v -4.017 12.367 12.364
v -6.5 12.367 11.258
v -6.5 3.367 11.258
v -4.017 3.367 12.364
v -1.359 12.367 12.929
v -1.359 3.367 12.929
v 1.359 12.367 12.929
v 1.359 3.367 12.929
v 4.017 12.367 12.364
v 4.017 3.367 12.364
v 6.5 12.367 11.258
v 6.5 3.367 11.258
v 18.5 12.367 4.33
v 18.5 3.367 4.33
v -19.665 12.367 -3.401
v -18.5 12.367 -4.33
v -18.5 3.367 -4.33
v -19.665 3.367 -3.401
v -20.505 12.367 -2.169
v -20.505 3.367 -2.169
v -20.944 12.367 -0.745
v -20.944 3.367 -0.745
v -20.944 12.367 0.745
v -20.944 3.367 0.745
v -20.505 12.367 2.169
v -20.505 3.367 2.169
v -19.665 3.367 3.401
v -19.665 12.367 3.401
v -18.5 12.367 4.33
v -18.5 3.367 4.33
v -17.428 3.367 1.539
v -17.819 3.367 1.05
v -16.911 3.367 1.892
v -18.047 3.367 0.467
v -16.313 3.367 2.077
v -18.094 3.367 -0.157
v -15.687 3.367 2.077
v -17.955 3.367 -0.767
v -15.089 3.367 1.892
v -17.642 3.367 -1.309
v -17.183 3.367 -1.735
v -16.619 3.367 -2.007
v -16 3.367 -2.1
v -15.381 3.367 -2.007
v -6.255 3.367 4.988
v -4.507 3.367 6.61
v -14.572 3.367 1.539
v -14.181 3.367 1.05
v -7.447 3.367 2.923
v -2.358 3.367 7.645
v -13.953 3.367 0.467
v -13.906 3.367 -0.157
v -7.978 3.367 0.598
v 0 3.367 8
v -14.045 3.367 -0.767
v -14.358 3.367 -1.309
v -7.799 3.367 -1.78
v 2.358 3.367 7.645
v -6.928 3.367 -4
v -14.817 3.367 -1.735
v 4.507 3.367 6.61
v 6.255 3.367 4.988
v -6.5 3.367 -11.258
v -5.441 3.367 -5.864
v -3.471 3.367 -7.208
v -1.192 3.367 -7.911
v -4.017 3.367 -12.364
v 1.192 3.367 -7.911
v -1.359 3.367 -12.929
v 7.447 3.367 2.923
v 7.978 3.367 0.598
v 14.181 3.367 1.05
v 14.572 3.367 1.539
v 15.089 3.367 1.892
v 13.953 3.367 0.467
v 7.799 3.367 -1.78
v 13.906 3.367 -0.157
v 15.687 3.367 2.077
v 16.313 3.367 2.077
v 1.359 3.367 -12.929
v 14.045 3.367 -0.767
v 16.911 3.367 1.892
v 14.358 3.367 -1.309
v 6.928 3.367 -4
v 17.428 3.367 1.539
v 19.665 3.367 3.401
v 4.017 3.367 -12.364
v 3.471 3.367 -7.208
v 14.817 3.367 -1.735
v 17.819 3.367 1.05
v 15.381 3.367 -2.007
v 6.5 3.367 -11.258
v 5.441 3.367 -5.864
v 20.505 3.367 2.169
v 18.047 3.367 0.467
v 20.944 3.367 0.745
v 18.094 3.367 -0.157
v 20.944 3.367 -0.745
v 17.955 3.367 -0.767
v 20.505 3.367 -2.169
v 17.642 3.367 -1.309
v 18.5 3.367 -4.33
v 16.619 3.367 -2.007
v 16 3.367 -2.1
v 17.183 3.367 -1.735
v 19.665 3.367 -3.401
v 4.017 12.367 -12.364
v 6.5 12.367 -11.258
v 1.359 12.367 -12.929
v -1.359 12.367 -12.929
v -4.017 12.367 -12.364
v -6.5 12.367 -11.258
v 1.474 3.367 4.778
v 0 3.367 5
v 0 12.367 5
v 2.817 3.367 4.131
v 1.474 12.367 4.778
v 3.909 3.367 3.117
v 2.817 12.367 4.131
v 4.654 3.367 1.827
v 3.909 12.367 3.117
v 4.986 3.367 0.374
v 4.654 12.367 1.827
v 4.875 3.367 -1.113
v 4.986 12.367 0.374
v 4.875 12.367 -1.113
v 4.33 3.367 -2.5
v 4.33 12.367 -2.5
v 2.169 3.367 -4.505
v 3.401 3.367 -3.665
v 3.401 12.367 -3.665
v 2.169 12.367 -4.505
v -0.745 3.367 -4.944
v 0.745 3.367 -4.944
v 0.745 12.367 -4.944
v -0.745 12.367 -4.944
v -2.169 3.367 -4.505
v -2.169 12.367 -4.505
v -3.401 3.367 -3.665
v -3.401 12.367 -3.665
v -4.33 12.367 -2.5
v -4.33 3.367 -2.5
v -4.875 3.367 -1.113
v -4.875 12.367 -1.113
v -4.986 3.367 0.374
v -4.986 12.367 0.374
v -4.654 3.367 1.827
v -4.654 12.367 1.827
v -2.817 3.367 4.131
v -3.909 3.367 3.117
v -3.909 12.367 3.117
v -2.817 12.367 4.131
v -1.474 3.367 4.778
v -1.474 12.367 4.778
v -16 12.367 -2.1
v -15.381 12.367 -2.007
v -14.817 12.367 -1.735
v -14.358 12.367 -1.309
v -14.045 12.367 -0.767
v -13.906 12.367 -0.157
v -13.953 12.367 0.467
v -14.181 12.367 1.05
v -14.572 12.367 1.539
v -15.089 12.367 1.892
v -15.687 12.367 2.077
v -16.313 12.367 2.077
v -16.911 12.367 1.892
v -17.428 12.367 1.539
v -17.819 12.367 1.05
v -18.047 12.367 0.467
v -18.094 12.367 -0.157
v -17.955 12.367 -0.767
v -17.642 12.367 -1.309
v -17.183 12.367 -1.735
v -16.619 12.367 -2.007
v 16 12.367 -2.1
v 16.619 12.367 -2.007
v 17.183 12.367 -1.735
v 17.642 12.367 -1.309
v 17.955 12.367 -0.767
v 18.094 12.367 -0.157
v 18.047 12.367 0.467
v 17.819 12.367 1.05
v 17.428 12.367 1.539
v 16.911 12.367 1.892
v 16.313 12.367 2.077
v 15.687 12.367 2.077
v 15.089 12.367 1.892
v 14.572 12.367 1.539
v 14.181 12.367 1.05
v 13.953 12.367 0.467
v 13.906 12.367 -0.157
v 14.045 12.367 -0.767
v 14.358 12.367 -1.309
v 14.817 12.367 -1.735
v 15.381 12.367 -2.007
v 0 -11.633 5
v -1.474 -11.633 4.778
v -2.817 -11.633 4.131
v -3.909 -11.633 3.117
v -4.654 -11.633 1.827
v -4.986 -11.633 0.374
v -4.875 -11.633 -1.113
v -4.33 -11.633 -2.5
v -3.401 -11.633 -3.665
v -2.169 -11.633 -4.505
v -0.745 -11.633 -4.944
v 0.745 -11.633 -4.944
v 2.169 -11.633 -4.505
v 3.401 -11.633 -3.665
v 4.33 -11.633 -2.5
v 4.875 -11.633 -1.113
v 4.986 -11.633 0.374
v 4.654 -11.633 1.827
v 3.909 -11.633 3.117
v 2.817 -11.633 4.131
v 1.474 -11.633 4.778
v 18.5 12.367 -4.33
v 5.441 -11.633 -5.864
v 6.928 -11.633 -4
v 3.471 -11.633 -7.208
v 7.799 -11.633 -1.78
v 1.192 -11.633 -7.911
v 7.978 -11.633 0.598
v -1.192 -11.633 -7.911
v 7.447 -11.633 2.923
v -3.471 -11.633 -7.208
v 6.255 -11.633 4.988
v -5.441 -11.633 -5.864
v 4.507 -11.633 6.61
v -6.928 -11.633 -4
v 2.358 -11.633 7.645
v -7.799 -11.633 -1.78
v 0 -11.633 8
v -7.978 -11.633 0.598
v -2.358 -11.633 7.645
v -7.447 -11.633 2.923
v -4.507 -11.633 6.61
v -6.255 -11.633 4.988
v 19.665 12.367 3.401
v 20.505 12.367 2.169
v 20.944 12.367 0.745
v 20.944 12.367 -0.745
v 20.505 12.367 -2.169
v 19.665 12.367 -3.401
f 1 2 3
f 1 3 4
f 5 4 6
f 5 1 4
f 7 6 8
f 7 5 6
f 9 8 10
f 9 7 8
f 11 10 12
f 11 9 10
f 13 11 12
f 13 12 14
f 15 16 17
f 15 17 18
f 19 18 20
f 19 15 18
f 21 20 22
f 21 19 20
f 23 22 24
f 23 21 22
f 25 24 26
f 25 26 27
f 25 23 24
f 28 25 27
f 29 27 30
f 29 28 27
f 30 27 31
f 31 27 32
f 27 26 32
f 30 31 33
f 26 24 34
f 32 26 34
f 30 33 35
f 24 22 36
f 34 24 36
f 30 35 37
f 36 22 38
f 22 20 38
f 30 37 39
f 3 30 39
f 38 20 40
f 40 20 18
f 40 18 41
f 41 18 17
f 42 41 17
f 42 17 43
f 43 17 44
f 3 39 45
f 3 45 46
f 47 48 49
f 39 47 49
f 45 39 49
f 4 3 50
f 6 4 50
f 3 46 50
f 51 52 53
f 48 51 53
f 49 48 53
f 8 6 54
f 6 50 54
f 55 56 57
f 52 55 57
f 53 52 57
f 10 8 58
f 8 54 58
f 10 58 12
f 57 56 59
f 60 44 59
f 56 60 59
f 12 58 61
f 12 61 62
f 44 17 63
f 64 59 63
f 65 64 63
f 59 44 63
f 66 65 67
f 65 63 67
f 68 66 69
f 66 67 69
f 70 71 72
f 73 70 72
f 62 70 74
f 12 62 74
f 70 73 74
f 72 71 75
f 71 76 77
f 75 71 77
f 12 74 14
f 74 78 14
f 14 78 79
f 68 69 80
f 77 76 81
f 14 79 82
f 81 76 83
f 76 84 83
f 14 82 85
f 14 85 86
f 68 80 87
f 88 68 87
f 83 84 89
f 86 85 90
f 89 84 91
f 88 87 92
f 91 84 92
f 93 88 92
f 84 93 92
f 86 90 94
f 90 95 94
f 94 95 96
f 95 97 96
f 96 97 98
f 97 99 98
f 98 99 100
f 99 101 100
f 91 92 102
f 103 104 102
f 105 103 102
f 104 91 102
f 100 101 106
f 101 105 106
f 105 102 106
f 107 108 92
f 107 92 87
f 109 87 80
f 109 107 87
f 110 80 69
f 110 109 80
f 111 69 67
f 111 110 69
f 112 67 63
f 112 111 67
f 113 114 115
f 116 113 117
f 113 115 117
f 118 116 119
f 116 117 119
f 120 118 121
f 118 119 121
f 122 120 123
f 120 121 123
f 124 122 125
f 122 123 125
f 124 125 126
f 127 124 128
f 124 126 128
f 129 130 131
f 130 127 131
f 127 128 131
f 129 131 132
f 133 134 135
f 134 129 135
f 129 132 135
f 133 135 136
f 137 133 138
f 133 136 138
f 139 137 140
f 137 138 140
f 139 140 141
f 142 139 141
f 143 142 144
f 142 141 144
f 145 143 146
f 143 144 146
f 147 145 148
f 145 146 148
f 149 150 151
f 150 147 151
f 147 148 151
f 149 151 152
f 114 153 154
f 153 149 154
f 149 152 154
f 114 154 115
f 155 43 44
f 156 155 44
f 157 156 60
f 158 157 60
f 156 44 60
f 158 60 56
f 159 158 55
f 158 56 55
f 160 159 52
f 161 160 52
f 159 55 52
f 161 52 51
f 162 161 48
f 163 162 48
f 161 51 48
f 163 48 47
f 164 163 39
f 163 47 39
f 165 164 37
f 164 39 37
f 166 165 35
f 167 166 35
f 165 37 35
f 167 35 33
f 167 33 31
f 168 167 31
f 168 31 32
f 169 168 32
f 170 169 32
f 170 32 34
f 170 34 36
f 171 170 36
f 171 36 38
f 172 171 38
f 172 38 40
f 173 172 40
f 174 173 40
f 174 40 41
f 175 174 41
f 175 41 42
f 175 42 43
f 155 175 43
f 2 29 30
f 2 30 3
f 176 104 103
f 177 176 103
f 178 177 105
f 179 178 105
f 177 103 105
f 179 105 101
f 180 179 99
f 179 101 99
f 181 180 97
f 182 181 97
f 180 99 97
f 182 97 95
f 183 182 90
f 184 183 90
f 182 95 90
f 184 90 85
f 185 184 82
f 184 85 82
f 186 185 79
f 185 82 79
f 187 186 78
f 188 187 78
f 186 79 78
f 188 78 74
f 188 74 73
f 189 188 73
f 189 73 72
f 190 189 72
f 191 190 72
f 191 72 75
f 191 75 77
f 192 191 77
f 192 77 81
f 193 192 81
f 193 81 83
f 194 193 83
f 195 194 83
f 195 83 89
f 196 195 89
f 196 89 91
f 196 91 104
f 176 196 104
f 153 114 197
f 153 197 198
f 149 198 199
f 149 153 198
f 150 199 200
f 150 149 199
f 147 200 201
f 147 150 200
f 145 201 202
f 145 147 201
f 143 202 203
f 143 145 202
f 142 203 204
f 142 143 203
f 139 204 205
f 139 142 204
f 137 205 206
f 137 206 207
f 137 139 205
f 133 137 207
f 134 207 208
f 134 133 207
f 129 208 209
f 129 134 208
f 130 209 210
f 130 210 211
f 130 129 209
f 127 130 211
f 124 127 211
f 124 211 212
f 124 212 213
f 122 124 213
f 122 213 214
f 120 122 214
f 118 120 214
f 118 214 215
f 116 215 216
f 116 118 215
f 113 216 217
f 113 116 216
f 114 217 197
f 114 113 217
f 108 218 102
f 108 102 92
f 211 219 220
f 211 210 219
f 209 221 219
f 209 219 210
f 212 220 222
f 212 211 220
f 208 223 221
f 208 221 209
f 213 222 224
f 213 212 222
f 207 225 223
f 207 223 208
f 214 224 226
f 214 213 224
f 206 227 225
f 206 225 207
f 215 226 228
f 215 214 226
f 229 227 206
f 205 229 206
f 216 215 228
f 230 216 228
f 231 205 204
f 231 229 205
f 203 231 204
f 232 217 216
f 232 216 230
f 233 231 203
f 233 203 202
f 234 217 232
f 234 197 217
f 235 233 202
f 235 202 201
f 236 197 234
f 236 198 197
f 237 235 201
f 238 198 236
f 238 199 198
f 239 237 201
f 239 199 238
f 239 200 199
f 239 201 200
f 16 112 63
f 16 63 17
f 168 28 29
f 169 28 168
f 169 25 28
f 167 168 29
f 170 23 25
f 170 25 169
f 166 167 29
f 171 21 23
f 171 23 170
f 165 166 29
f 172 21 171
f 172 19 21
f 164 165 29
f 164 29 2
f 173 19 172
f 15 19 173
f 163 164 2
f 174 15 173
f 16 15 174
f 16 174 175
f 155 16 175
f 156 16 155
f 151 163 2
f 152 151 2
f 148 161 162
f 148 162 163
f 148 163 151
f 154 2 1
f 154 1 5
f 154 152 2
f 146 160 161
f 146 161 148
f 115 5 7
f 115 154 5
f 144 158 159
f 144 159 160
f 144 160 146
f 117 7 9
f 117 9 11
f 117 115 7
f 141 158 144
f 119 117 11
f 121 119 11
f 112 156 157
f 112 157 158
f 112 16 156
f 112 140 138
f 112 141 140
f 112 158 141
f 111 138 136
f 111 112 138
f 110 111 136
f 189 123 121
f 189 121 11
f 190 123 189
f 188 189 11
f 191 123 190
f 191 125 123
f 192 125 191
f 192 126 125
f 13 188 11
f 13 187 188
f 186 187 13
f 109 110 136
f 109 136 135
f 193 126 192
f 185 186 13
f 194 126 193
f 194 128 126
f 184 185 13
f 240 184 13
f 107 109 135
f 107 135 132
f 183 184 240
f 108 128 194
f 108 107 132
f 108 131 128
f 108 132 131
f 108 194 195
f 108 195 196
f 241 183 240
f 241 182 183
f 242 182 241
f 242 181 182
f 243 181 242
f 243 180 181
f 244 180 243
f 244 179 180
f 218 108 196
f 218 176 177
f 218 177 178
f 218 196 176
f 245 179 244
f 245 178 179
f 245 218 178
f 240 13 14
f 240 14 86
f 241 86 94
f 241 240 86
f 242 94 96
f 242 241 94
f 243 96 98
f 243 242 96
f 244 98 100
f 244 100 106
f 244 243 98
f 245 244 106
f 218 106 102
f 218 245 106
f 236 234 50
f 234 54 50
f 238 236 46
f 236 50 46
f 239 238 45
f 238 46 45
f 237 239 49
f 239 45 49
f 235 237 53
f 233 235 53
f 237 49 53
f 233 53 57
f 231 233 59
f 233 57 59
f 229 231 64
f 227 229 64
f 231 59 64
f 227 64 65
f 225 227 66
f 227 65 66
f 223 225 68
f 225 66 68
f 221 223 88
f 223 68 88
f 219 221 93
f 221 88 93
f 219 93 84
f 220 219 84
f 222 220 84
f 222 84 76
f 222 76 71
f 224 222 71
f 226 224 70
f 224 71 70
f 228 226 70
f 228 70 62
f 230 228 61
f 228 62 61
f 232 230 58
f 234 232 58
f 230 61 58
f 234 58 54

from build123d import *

# Parameters (mm, degrees)
SKETCH1_W                 = 3
SKETCH1_H                 = 15
BOSS_EXTRUDE1_START       = 9
SKETCH2_R                 = 5
BOSS_EXTRUDE1_DEPTH       = 9
M5X0_8_TAPPED_HOLE1_D     = 4.2
M5X0_8_TAPPED_HOLE1_DEPTH = 12.4
M5X0_8_TAPPED_HOLE1_TIP   = 1.2618073


with BuildPart() as part:
    # Sketch1 → Revolve1 (revolve)
    with BuildSketch(Plane.XY, mode=Mode.PRIVATE) as revolve1_sk:
        with Locations((-6.5, -4.132653061)):
            Rectangle(SKETCH1_W, SKETCH1_H)
    revolve(revolve1_sk.sketch.rotate(Axis((0, 8.367346939, 0), (0, -1, 0)), 270), axis=Axis((0, 8.367346939, 0), (0, -1, 0)))

    # Sketch2 → Boss-Extrude1 (add)
    with BuildSketch(Plane(origin=(0, 3.367346939, 0), x_dir=(1, 0, 0), z_dir=(0, 1, 0)).offset(BOSS_EXTRUDE1_START)):
        with BuildLine():
            Line((-6.5, 11.258330249), (-18.5, 4.330127019))
            ThreePointArc((-18.5, 4.330127019), (-21, 0), (-18.5, -4.330127019))
            Line((-18.5, -4.330127019), (-6.5, -11.258330249))
            ThreePointArc((-6.5, -11.258330249), (0, -13), (6.5, -11.258330249))
            Line((6.5, -11.258330249), (18.5, -4.330127019))
            ThreePointArc((18.5, -4.330127019), (21, 0), (18.5, 4.330127019))
            Line((18.5, 4.330127019), (6.5, 11.258330249))
            ThreePointArc((6.5, 11.258330249), (0, 13), (-6.5, 11.258330249))
        make_face()
        with Locations(Location((0, 0, 0), (0, 0, 270))):
            Circle(SKETCH2_R, mode=Mode.SUBTRACT)
    extrude(amount=-BOSS_EXTRUDE1_DEPTH)

    # M5x0.8 Tapped Hole1
    with Locations(Plane(origin=(-16, 12.367346939, 0), x_dir=(0, 0, 1), z_dir=(0, 1, 0))):
        with Locations((0, 0), (0, 32)):
            Hole(M5X0_8_TAPPED_HOLE1_D / 2, depth=M5X0_8_TAPPED_HOLE1_DEPTH)
            with Locations((0, 0, -(M5X0_8_TAPPED_HOLE1_DEPTH + M5X0_8_TAPPED_HOLE1_TIP / 2))):  # 118° drill point
                Cone(0, M5X0_8_TAPPED_HOLE1_D / 2, M5X0_8_TAPPED_HOLE1_TIP, mode=Mode.SUBTRACT)


solid = part.part
